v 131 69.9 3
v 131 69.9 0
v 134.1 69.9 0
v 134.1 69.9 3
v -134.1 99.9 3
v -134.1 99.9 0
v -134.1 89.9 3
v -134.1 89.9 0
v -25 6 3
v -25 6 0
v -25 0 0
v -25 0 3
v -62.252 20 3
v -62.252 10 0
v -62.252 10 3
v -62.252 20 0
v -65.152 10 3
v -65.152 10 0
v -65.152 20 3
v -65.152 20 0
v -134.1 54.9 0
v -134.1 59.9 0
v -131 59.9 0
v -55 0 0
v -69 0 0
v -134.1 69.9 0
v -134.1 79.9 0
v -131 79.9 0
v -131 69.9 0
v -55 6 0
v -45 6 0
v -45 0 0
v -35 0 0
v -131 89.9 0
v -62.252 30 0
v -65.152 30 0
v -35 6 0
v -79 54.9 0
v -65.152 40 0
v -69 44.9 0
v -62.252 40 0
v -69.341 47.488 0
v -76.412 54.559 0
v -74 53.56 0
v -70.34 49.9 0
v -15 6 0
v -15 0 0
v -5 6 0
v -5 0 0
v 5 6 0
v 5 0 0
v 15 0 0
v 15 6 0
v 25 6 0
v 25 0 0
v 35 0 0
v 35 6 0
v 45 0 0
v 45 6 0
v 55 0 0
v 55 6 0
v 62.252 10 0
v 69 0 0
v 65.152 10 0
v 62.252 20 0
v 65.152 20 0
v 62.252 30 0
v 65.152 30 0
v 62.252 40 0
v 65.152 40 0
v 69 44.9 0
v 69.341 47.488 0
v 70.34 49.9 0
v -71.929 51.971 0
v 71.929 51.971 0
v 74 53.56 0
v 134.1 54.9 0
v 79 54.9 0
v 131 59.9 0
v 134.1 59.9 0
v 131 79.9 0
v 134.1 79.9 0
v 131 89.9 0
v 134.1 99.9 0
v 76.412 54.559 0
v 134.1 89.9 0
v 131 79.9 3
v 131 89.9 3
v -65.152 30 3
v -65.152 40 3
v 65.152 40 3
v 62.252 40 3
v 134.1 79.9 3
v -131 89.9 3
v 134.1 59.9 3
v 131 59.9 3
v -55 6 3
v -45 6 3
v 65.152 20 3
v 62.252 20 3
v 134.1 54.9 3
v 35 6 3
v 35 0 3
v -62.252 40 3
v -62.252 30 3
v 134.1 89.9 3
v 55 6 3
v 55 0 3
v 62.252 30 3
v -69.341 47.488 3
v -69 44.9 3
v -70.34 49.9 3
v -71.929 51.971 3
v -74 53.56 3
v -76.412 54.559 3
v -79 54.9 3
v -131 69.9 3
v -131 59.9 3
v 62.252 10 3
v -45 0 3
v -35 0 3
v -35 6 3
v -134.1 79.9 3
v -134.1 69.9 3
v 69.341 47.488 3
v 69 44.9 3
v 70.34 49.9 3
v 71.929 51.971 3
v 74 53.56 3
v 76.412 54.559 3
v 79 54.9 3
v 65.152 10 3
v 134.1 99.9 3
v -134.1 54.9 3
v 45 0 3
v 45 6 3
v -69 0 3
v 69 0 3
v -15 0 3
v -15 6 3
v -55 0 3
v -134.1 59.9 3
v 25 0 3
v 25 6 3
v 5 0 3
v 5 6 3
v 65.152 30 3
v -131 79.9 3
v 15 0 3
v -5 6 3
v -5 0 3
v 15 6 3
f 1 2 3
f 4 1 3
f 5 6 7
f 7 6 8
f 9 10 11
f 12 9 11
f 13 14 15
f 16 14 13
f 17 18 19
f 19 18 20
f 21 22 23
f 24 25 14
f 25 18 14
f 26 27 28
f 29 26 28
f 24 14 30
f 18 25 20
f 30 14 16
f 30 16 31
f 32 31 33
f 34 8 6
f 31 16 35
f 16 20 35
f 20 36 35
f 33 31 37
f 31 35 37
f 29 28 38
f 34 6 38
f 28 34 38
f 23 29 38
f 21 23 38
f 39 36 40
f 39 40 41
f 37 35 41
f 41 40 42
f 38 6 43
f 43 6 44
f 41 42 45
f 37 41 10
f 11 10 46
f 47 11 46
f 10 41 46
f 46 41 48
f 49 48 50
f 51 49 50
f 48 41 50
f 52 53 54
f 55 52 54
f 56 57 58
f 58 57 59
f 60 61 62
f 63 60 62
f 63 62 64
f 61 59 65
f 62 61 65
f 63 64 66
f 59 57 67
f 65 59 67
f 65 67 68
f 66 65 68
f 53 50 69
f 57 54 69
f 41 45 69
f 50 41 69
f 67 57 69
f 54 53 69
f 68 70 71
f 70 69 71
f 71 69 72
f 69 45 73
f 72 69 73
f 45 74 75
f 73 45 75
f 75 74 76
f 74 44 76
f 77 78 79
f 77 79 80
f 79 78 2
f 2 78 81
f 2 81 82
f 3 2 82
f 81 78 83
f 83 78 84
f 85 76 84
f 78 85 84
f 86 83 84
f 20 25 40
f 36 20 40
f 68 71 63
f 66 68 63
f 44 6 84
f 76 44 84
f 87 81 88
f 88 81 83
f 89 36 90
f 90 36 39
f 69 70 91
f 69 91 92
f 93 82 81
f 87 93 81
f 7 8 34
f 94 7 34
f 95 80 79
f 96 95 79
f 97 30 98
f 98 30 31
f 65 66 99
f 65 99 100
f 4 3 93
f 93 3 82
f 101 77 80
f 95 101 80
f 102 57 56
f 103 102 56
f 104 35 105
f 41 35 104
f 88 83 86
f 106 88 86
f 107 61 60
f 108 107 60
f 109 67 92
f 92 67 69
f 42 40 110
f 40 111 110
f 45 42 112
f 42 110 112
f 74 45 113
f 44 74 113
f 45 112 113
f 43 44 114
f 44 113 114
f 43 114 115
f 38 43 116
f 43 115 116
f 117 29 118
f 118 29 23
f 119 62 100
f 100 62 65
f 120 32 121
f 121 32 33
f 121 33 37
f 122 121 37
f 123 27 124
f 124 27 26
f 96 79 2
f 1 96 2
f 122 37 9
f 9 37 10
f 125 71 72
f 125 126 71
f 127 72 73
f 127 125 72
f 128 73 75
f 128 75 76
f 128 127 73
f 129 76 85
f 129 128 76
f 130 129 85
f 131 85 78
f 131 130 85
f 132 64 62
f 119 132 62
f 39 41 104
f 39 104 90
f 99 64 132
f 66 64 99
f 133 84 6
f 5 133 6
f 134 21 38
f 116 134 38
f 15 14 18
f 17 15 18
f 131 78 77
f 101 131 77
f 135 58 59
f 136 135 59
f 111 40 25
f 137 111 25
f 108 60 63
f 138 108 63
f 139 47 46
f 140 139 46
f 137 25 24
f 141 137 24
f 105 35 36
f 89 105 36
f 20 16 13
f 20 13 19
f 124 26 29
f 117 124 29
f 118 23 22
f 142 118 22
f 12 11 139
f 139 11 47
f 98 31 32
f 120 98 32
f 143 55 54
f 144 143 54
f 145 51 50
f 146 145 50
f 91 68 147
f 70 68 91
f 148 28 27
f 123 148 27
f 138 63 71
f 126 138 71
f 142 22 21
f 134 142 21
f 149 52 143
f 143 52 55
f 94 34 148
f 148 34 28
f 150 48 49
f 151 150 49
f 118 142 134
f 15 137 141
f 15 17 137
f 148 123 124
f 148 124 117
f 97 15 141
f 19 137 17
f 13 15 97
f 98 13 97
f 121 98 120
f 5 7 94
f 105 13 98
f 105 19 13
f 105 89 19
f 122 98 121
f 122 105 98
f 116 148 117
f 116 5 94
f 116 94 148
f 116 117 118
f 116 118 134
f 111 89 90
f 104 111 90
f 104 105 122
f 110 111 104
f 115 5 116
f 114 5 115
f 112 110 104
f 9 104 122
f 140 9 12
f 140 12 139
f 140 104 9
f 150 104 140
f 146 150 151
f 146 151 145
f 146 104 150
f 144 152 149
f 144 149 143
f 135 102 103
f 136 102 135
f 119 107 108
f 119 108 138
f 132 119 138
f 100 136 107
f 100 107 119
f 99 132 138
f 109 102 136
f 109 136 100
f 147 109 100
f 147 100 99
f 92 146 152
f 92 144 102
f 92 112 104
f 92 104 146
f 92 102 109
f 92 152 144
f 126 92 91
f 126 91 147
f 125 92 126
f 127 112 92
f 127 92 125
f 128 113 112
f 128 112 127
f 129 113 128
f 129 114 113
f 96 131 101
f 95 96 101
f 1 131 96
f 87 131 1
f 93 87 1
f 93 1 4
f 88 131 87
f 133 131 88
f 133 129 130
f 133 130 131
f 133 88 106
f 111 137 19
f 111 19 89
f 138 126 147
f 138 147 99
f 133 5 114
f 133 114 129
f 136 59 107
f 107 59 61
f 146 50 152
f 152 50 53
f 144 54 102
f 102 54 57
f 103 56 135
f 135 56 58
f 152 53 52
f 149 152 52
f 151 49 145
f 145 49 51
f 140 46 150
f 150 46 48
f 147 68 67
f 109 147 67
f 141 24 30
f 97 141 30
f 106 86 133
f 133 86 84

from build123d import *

# Parameters (mm, degrees)
BOSS_EXTRUDE1_DEPTH = 3
FILLET1_R           = 10
SKETCH2_W           = 2.9
SKETCH2_H           = 10
CUT_EXTRUDE1_DEPTH  = 168.247780254


with BuildPart() as part:
    # Sketch1 → Boss-Extrude1 (new body)
    with BuildSketch(Plane.XY):
        Polygon((-69, 54.9), (-69, 0), (-55, 0), (-55, 6), (-45, 6), (-45, 0), (-35, 0), (-35, 6), (-25, 6), (-25, 0), (-15, 0), (-15, 6), (-5, 6), (-5, 0), (5, 0), (5, 6), (15, 6), (15, 0), (25, 0), (25, 6), (35, 6), (35, 0), (45, 0), (45, 6), (55, 6), (55, 0), (69, 0), (69, 54.9), (134.1, 54.9), (134.1, 59.9), (131, 59.9), (131, 69.9), (134.1, 69.9), (134.1, 79.9), (131, 79.9), (131, 89.9), (134.1, 89.9), (134.1, 99.9), (-134.1, 99.9), (-134.1, 89.9), (-131, 89.9), (-131, 79.9), (-134.1, 79.9), (-134.1, 69.9), (-131, 69.9), (-131, 59.9), (-134.1, 59.9), (-134.1, 54.9), align=None)
    extrude(amount=BOSS_EXTRUDE1_DEPTH)

    # Fillet1
    fillet1_edges = [part.edges().sort_by_distance(p)[0] for p in [
        (69, 54.9, 1.5),
        (-69, 54.9, 1.5),
    ]]
    fillet(fillet1_edges, radius=FILLET1_R)

    # Sketch2 → Cut-Extrude1 (cut, through all)
    with BuildSketch(Plane(origin=(0, 0, 0), x_dir=(-1, 0, 0), z_dir=(0, 0, -1))):
        with Locations((-63.702453972, 15)):
            Rectangle(SKETCH2_W, SKETCH2_H)
        with Locations((-63.702453972, 35)):
            Rectangle(SKETCH2_W, SKETCH2_H)
        with Locations((63.702453972, 35)):
            Rectangle(SKETCH2_W, SKETCH2_H)
        with Locations((63.702453972, 15)):
            Rectangle(SKETCH2_W, SKETCH2_H)
    extrude(amount=-CUT_EXTRUDE1_DEPTH, mode=Mode.SUBTRACT)


solid = part.part
